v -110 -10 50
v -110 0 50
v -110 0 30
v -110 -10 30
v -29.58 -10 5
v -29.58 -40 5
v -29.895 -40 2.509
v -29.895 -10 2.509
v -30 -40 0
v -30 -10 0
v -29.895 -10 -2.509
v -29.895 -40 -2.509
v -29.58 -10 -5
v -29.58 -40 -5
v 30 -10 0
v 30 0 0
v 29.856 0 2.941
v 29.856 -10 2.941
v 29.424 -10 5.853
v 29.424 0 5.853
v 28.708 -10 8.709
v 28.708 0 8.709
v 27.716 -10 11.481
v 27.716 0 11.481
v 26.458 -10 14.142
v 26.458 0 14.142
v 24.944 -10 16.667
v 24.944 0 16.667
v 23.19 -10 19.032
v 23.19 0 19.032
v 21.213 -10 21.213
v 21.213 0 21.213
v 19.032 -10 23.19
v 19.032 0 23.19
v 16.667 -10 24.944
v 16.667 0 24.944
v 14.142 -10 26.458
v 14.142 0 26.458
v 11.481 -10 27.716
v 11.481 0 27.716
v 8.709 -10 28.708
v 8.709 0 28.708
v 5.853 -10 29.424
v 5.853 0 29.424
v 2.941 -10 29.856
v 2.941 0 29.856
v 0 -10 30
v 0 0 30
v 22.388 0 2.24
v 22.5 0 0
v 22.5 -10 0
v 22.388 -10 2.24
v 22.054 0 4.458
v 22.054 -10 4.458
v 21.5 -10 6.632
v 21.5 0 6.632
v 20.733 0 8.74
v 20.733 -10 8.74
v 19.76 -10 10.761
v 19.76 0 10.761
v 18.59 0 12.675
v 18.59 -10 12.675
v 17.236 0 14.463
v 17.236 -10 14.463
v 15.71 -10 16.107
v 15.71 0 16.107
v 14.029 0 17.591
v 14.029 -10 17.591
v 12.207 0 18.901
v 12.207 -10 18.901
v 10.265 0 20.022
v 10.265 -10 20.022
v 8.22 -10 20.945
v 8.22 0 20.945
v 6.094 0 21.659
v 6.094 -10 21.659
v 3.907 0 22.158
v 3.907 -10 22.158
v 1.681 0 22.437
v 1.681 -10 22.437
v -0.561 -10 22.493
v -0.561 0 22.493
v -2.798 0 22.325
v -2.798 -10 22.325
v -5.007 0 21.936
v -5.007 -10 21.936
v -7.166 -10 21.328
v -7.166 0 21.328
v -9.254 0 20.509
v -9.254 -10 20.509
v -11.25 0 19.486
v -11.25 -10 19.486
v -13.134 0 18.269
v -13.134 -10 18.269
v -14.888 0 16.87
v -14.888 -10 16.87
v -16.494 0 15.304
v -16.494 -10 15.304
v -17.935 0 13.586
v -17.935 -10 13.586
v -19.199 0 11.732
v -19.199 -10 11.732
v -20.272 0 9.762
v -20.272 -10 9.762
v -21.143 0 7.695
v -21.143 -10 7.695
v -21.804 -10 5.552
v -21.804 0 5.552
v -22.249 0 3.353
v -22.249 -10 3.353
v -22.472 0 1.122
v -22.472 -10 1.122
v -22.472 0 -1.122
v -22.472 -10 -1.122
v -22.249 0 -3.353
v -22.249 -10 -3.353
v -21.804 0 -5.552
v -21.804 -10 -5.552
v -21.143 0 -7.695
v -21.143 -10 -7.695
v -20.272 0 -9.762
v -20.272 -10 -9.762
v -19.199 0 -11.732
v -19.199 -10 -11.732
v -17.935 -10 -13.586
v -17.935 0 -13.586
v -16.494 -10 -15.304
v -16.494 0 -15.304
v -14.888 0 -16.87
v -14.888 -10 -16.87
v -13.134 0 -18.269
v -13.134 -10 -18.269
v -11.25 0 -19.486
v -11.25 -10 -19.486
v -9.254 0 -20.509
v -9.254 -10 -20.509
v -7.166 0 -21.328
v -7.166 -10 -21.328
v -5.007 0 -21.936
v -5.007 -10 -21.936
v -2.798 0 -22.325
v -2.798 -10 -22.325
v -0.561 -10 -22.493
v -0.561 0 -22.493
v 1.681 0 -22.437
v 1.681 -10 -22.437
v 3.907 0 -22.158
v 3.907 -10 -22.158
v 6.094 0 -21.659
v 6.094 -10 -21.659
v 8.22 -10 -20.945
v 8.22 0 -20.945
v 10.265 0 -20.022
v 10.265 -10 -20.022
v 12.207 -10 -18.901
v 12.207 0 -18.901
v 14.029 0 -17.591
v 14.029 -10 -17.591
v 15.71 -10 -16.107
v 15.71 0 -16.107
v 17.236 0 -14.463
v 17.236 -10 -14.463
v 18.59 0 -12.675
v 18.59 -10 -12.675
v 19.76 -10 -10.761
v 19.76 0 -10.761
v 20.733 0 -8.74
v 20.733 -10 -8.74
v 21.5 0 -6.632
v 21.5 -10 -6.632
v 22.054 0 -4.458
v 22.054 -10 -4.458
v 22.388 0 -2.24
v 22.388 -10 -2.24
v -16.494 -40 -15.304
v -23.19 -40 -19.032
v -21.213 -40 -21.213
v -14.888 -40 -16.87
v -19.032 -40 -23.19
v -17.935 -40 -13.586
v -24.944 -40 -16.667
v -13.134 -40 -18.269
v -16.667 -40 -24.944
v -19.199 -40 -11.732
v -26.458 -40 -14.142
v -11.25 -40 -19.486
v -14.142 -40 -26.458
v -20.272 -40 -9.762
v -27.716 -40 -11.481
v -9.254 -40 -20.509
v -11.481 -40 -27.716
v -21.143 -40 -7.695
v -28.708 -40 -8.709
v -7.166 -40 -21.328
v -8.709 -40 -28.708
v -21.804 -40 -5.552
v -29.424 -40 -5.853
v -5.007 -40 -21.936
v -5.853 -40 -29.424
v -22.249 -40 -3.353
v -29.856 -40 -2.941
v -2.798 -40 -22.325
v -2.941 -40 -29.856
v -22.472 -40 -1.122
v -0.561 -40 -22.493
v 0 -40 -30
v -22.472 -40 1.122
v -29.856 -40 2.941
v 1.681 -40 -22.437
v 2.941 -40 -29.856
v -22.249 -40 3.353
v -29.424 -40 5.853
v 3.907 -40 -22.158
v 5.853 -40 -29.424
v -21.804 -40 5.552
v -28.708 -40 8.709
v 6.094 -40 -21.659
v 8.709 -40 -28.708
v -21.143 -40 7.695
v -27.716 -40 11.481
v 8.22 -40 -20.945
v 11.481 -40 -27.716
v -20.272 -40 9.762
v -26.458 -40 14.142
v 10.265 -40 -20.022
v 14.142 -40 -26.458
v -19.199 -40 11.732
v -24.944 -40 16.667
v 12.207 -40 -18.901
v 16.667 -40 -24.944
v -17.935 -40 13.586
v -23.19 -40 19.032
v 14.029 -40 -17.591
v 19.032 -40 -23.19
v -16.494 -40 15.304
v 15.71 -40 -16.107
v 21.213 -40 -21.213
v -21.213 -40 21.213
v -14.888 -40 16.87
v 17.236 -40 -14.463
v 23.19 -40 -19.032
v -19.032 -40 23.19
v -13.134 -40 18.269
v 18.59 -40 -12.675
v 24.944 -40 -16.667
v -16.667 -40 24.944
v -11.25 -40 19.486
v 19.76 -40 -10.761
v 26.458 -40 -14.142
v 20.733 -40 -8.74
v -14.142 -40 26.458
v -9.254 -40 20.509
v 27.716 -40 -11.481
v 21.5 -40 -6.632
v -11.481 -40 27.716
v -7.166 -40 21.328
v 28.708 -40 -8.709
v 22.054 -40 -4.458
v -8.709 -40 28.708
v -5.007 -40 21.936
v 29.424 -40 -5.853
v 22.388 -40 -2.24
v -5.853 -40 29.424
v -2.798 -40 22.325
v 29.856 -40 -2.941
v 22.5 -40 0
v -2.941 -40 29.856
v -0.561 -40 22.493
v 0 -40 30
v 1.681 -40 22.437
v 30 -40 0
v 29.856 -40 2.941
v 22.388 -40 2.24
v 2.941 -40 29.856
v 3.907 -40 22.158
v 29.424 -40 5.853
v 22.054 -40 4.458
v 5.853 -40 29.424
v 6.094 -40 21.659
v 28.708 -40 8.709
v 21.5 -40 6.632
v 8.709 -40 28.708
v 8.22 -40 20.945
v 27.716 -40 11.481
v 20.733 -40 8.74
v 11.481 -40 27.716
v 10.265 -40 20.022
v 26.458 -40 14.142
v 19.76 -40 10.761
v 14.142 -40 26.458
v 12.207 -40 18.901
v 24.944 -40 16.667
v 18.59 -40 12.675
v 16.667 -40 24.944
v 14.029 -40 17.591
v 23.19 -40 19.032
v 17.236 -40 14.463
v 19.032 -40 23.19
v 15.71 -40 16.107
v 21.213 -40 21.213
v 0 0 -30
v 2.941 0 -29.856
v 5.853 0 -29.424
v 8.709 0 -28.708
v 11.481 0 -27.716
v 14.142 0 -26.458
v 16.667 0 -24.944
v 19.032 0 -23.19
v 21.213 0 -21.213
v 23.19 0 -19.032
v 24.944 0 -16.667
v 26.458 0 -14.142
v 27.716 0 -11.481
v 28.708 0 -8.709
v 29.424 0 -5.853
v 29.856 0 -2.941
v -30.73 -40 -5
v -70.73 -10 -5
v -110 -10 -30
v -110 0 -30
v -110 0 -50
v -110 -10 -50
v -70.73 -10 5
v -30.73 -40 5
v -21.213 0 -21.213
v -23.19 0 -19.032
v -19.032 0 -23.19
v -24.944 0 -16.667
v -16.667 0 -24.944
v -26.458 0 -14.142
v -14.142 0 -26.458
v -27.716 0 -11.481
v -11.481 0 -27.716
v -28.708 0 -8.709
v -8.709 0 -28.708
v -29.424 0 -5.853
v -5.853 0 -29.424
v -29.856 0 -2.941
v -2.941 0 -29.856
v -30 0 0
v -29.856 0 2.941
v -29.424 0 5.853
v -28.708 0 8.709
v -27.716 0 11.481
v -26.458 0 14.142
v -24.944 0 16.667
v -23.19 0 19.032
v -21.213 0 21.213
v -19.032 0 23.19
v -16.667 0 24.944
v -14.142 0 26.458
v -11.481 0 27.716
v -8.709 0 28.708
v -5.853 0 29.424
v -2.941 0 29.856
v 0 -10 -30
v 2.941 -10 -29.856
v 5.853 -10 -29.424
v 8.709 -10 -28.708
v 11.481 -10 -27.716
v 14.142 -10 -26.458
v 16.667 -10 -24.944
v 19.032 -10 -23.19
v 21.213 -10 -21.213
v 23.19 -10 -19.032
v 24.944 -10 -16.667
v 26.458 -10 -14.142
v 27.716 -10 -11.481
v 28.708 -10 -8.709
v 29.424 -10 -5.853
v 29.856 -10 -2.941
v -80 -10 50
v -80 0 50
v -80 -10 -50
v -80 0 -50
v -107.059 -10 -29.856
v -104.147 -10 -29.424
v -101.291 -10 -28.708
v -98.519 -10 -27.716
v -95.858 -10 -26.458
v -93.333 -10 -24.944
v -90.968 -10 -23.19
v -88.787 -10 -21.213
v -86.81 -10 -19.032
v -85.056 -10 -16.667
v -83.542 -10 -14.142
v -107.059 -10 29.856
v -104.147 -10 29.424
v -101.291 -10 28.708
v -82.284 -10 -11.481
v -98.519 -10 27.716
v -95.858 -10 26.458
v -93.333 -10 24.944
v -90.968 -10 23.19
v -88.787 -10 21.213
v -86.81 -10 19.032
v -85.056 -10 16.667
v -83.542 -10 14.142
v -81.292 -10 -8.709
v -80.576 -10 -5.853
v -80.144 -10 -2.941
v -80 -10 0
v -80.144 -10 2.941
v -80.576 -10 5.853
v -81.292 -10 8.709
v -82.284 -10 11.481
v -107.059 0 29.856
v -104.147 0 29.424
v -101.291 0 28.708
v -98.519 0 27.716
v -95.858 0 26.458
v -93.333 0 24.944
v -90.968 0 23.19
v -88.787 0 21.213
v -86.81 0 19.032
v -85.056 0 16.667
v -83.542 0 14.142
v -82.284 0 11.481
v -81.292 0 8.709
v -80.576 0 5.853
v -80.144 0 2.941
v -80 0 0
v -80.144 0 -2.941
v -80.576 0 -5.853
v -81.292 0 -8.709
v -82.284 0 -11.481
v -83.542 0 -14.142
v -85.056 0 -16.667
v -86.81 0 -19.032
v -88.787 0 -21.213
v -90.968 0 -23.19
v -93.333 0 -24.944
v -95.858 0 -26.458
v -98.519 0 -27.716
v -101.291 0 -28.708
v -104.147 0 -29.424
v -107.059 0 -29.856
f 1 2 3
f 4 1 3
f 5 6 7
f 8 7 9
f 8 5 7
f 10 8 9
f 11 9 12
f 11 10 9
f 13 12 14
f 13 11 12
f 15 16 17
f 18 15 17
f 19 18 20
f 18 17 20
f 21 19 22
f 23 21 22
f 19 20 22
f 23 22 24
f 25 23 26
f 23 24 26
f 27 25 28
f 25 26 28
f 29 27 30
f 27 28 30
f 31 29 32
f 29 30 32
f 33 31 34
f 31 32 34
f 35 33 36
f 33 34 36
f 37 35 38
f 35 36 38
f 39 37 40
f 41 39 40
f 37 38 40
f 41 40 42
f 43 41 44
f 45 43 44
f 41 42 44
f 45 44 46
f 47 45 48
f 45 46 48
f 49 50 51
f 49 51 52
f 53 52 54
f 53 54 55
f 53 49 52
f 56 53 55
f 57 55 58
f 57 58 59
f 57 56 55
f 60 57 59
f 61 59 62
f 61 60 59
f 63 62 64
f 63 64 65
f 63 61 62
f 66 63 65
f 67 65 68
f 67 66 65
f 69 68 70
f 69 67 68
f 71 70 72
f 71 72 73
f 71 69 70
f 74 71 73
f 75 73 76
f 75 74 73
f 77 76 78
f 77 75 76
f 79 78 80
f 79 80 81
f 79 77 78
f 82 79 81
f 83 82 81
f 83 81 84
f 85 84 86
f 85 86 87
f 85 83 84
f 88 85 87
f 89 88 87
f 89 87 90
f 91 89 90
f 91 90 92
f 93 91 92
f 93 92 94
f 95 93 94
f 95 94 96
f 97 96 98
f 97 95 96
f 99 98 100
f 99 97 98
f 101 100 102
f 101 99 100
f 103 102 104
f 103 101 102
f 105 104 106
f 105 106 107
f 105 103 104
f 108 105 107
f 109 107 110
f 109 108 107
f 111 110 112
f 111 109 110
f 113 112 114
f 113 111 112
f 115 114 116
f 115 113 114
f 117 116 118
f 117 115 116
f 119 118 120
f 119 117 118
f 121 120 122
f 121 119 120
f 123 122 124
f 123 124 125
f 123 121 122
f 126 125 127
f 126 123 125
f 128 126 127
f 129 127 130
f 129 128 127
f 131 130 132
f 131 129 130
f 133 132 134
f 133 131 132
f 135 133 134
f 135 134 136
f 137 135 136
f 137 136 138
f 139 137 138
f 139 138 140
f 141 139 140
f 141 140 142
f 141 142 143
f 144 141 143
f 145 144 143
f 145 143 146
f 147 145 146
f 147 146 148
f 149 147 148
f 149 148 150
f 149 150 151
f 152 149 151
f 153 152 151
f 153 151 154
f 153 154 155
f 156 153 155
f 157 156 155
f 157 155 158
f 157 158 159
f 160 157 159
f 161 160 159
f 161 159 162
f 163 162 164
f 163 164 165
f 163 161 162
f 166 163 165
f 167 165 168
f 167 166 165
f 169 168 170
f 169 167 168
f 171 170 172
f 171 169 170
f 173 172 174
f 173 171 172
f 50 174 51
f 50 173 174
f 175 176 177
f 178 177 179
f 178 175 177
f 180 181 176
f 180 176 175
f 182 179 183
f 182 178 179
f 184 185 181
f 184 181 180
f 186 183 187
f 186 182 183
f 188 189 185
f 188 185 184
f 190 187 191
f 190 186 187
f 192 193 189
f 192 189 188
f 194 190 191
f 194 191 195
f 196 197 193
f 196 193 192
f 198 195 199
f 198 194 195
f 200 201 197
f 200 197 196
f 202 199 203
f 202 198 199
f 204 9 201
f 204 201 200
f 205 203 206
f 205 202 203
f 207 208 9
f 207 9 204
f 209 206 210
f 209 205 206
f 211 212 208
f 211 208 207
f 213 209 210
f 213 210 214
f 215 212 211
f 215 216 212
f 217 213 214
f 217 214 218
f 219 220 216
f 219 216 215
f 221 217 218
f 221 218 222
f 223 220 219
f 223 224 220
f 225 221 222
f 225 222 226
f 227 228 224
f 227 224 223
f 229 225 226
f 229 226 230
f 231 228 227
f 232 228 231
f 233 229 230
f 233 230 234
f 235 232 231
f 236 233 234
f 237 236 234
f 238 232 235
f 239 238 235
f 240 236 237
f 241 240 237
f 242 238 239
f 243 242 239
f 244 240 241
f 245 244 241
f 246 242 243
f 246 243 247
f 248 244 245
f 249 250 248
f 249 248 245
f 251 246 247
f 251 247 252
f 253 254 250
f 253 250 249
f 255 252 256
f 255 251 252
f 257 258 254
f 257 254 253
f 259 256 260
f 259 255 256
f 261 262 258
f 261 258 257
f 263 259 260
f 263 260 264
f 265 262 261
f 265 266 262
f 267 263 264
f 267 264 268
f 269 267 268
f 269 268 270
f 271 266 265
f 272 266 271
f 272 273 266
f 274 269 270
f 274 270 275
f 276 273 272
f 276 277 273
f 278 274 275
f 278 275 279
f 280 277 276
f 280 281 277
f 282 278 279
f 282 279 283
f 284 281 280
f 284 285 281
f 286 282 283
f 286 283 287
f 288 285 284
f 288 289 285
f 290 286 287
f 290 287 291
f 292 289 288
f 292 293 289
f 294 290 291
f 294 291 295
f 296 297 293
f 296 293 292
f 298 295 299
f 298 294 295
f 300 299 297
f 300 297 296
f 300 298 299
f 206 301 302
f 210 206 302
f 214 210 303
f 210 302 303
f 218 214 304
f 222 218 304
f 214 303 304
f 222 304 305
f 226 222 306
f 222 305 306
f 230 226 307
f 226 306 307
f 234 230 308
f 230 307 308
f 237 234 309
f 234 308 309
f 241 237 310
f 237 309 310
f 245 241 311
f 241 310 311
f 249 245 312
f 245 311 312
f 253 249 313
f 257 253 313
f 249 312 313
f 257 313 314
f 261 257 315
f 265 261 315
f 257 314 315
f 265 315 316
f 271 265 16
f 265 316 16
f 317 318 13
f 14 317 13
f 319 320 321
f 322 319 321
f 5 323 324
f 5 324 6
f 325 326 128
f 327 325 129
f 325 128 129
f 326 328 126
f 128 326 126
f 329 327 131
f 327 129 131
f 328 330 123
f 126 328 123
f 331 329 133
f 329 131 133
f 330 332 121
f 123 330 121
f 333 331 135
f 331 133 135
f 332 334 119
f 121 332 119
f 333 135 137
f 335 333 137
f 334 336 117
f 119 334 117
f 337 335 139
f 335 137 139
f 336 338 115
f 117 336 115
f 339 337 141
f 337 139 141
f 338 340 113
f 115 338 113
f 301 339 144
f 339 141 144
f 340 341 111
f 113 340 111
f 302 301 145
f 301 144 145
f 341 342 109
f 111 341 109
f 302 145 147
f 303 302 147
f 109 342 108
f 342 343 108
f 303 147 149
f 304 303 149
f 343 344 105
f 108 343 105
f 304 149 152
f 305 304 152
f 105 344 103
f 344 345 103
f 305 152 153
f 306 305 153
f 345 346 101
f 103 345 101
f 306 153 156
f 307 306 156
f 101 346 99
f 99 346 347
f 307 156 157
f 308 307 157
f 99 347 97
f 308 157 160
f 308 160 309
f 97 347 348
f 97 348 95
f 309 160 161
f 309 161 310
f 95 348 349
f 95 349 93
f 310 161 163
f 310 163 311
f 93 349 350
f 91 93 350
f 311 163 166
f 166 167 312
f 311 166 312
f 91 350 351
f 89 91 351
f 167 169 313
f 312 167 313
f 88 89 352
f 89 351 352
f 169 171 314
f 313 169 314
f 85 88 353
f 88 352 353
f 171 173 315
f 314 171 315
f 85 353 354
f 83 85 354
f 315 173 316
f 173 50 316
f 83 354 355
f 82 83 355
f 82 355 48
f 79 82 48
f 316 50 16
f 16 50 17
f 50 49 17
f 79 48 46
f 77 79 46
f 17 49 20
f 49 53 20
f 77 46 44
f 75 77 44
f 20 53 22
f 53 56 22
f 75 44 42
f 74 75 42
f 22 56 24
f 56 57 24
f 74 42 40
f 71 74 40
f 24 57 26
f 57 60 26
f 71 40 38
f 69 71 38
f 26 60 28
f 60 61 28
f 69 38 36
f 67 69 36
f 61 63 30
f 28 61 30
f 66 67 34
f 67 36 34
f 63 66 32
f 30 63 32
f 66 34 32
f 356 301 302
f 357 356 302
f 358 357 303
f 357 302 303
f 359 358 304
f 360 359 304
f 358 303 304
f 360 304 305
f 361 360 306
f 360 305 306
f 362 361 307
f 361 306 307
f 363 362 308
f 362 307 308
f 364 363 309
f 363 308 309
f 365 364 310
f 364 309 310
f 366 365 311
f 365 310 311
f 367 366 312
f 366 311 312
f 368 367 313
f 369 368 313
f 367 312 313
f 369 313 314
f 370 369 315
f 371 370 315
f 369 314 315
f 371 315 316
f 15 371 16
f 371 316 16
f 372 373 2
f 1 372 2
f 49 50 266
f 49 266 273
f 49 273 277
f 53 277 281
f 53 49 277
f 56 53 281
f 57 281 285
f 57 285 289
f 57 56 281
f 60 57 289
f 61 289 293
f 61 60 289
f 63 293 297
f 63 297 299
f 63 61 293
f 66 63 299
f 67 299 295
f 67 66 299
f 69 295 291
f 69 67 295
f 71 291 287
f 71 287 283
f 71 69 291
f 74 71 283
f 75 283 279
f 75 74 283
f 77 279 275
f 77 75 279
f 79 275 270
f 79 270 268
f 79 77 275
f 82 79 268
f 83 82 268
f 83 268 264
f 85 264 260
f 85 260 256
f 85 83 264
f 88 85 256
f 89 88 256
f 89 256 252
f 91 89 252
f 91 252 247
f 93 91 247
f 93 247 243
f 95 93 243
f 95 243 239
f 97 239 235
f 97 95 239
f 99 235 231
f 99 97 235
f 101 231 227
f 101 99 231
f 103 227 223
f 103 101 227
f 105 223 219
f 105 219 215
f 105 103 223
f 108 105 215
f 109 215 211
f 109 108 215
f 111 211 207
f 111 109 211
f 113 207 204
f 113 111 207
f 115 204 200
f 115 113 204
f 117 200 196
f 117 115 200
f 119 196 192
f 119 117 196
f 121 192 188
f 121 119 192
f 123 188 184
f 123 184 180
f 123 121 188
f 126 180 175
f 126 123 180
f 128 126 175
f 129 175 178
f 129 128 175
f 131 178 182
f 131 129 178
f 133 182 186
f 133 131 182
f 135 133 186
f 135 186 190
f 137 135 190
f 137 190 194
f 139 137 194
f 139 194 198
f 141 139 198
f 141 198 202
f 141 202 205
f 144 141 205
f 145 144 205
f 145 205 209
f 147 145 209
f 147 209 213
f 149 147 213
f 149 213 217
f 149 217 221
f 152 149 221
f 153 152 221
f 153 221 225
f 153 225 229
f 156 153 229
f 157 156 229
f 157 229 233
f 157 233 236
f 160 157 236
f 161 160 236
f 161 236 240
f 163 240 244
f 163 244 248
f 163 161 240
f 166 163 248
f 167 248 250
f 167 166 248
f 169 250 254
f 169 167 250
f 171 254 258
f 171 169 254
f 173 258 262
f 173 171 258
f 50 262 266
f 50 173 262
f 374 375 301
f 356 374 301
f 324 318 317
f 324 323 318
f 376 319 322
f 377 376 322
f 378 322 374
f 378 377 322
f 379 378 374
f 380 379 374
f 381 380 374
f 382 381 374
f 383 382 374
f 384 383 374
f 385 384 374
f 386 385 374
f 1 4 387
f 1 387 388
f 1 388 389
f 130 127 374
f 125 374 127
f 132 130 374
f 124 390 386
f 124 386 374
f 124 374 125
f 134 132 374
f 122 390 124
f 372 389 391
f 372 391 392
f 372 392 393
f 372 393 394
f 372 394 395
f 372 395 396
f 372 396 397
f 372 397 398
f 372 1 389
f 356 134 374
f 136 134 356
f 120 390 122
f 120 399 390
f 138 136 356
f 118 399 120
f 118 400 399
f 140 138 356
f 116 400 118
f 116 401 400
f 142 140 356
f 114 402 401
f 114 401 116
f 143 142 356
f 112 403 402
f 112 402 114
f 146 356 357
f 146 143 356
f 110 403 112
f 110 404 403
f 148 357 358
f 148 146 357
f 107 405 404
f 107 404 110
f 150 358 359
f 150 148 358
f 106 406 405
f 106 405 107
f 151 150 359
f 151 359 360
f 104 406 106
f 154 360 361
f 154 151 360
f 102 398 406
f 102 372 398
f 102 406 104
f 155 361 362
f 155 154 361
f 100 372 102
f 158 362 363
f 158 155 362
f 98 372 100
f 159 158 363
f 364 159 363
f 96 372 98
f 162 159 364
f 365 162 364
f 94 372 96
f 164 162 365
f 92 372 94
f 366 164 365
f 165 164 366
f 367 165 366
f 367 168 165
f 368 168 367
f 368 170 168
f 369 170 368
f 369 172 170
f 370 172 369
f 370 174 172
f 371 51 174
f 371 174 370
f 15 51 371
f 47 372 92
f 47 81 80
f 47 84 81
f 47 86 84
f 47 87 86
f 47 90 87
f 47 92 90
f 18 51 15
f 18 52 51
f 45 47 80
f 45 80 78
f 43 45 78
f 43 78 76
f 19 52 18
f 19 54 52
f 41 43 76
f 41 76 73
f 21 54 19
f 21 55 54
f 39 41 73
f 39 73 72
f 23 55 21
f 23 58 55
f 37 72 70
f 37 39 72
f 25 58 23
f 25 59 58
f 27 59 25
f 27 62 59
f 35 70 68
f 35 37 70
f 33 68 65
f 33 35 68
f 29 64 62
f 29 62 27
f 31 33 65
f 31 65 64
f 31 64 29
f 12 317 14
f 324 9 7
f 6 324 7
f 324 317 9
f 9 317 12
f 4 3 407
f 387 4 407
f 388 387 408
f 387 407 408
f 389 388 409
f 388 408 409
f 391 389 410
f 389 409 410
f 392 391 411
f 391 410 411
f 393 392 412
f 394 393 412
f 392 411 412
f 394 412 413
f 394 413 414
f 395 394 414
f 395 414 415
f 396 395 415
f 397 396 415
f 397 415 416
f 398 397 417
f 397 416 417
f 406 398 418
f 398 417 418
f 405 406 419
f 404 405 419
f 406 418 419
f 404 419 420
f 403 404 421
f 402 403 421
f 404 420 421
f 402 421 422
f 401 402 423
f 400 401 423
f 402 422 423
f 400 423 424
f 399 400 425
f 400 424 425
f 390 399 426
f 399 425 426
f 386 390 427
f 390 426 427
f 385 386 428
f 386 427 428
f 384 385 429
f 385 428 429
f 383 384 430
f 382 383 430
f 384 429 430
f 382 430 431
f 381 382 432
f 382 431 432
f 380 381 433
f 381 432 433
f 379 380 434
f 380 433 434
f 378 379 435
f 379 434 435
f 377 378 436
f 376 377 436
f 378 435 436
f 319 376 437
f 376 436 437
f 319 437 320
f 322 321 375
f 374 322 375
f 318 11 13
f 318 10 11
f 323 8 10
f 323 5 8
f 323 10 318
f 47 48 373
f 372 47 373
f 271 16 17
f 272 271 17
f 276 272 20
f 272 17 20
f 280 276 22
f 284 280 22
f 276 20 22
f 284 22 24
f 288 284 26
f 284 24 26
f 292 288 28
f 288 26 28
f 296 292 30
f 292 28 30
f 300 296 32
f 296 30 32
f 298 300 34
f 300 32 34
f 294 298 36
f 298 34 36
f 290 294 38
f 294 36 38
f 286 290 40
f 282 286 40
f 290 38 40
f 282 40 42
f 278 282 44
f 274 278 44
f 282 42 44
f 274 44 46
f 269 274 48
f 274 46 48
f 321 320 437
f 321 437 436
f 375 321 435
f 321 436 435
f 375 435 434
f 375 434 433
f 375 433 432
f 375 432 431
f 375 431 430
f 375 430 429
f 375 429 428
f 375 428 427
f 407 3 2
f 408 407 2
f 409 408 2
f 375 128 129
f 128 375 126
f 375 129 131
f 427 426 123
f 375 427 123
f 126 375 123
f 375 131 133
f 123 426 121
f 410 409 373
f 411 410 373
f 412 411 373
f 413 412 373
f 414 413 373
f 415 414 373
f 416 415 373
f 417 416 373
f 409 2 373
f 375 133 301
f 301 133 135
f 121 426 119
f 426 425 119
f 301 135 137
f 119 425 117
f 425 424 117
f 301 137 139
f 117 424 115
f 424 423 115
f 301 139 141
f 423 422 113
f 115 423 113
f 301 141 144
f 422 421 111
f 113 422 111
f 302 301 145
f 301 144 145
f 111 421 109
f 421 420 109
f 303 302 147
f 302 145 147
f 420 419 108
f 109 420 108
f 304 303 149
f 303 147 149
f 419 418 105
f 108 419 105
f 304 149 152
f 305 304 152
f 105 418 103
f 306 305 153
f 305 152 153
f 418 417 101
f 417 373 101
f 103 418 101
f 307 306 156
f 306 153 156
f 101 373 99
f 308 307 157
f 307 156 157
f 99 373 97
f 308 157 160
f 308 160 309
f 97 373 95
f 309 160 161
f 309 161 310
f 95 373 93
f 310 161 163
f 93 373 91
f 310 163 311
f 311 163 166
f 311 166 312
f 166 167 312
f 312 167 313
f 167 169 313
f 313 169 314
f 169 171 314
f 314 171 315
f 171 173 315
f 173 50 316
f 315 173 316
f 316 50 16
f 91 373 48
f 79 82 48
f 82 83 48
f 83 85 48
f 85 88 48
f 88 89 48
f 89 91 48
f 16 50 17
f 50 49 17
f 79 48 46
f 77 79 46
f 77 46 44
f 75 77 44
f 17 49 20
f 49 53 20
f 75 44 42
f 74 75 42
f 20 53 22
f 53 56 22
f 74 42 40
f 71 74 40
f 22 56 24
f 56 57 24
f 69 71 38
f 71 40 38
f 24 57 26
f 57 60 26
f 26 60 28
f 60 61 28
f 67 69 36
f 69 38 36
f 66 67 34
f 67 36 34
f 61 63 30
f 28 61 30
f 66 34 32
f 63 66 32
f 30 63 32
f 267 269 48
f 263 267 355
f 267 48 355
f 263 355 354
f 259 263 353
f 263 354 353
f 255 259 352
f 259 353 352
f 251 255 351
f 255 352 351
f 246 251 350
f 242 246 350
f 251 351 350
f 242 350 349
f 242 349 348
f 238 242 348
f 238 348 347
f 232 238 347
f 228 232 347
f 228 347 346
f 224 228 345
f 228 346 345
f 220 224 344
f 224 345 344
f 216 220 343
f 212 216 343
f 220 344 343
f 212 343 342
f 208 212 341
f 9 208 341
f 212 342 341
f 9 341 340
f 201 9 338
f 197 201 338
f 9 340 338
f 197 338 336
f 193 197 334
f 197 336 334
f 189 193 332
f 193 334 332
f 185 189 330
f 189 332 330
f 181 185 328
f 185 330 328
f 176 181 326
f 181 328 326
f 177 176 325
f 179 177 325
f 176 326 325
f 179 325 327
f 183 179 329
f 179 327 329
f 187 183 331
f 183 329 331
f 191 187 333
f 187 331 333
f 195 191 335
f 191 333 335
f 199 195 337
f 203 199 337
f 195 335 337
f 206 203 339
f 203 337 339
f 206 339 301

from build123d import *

# Parameters (mm, degrees)
F0_R     = 22.5
F1_DEPTH = 40
F2_DEPTH = 10
F4_DEPTH = 5


with BuildPart() as f1:
    # F0 (on Front) → F1 (new body)
    with BuildSketch(Plane.XZ):
        with BuildLine():
            ThreePointArc((30, 0), (21.213203, 21.213203), (0, 30))
            ThreePointArc((0, 30), (-30, 0), (0, -30))
            ThreePointArc((0, -30), (21.213203, -21.213203), (30, 0))
        make_face()
        Circle(F0_R, mode=Mode.SUBTRACT)
    extrude(amount=F1_DEPTH)


with BuildPart() as f2:
    # F0 (on Front) → F2 (new body)
    with BuildSketch(Plane.XZ):
        with BuildLine():
            Line((0, 30), (-80, 50))
            Line((-80, 50), (-110, 50))
            Line((-110, 50), (-110, 30))
            ThreePointArc((-110, 30), (-80, 0), (-110, -30))
            Line((-110, -30), (-110, -50))
            Line((-110, -50), (-80, -50))
            Line((-80, -50), (0, -30))
            ThreePointArc((0, -30), (-30, 0), (0, 30))
        make_face()
        with BuildLine():
            ThreePointArc((30, 0), (21.213203, 21.213203), (0, 30))
            ThreePointArc((0, 30), (-30, 0), (0, -30))
            ThreePointArc((0, -30), (21.213203, -21.213203), (30, 0))
        make_face()
        Circle(F0_R, mode=Mode.SUBTRACT)
    extrude(amount=F2_DEPTH)


with BuildPart() as f4:
    # F3 (on Top) → F4 (new body, symmetric)
    with BuildSketch(Plane.XY):
        Polygon((-70.729569, -10), (-30.729569, -40), (-28.729569, -40), (-28.729569, -10), align=None)
    extrude(amount=F4_DEPTH, both=True)

    # F5: cut F1
    add(f1.part, mode=Mode.SUBTRACT)


solid = Compound([f1.part, f2.part, f4.part])
